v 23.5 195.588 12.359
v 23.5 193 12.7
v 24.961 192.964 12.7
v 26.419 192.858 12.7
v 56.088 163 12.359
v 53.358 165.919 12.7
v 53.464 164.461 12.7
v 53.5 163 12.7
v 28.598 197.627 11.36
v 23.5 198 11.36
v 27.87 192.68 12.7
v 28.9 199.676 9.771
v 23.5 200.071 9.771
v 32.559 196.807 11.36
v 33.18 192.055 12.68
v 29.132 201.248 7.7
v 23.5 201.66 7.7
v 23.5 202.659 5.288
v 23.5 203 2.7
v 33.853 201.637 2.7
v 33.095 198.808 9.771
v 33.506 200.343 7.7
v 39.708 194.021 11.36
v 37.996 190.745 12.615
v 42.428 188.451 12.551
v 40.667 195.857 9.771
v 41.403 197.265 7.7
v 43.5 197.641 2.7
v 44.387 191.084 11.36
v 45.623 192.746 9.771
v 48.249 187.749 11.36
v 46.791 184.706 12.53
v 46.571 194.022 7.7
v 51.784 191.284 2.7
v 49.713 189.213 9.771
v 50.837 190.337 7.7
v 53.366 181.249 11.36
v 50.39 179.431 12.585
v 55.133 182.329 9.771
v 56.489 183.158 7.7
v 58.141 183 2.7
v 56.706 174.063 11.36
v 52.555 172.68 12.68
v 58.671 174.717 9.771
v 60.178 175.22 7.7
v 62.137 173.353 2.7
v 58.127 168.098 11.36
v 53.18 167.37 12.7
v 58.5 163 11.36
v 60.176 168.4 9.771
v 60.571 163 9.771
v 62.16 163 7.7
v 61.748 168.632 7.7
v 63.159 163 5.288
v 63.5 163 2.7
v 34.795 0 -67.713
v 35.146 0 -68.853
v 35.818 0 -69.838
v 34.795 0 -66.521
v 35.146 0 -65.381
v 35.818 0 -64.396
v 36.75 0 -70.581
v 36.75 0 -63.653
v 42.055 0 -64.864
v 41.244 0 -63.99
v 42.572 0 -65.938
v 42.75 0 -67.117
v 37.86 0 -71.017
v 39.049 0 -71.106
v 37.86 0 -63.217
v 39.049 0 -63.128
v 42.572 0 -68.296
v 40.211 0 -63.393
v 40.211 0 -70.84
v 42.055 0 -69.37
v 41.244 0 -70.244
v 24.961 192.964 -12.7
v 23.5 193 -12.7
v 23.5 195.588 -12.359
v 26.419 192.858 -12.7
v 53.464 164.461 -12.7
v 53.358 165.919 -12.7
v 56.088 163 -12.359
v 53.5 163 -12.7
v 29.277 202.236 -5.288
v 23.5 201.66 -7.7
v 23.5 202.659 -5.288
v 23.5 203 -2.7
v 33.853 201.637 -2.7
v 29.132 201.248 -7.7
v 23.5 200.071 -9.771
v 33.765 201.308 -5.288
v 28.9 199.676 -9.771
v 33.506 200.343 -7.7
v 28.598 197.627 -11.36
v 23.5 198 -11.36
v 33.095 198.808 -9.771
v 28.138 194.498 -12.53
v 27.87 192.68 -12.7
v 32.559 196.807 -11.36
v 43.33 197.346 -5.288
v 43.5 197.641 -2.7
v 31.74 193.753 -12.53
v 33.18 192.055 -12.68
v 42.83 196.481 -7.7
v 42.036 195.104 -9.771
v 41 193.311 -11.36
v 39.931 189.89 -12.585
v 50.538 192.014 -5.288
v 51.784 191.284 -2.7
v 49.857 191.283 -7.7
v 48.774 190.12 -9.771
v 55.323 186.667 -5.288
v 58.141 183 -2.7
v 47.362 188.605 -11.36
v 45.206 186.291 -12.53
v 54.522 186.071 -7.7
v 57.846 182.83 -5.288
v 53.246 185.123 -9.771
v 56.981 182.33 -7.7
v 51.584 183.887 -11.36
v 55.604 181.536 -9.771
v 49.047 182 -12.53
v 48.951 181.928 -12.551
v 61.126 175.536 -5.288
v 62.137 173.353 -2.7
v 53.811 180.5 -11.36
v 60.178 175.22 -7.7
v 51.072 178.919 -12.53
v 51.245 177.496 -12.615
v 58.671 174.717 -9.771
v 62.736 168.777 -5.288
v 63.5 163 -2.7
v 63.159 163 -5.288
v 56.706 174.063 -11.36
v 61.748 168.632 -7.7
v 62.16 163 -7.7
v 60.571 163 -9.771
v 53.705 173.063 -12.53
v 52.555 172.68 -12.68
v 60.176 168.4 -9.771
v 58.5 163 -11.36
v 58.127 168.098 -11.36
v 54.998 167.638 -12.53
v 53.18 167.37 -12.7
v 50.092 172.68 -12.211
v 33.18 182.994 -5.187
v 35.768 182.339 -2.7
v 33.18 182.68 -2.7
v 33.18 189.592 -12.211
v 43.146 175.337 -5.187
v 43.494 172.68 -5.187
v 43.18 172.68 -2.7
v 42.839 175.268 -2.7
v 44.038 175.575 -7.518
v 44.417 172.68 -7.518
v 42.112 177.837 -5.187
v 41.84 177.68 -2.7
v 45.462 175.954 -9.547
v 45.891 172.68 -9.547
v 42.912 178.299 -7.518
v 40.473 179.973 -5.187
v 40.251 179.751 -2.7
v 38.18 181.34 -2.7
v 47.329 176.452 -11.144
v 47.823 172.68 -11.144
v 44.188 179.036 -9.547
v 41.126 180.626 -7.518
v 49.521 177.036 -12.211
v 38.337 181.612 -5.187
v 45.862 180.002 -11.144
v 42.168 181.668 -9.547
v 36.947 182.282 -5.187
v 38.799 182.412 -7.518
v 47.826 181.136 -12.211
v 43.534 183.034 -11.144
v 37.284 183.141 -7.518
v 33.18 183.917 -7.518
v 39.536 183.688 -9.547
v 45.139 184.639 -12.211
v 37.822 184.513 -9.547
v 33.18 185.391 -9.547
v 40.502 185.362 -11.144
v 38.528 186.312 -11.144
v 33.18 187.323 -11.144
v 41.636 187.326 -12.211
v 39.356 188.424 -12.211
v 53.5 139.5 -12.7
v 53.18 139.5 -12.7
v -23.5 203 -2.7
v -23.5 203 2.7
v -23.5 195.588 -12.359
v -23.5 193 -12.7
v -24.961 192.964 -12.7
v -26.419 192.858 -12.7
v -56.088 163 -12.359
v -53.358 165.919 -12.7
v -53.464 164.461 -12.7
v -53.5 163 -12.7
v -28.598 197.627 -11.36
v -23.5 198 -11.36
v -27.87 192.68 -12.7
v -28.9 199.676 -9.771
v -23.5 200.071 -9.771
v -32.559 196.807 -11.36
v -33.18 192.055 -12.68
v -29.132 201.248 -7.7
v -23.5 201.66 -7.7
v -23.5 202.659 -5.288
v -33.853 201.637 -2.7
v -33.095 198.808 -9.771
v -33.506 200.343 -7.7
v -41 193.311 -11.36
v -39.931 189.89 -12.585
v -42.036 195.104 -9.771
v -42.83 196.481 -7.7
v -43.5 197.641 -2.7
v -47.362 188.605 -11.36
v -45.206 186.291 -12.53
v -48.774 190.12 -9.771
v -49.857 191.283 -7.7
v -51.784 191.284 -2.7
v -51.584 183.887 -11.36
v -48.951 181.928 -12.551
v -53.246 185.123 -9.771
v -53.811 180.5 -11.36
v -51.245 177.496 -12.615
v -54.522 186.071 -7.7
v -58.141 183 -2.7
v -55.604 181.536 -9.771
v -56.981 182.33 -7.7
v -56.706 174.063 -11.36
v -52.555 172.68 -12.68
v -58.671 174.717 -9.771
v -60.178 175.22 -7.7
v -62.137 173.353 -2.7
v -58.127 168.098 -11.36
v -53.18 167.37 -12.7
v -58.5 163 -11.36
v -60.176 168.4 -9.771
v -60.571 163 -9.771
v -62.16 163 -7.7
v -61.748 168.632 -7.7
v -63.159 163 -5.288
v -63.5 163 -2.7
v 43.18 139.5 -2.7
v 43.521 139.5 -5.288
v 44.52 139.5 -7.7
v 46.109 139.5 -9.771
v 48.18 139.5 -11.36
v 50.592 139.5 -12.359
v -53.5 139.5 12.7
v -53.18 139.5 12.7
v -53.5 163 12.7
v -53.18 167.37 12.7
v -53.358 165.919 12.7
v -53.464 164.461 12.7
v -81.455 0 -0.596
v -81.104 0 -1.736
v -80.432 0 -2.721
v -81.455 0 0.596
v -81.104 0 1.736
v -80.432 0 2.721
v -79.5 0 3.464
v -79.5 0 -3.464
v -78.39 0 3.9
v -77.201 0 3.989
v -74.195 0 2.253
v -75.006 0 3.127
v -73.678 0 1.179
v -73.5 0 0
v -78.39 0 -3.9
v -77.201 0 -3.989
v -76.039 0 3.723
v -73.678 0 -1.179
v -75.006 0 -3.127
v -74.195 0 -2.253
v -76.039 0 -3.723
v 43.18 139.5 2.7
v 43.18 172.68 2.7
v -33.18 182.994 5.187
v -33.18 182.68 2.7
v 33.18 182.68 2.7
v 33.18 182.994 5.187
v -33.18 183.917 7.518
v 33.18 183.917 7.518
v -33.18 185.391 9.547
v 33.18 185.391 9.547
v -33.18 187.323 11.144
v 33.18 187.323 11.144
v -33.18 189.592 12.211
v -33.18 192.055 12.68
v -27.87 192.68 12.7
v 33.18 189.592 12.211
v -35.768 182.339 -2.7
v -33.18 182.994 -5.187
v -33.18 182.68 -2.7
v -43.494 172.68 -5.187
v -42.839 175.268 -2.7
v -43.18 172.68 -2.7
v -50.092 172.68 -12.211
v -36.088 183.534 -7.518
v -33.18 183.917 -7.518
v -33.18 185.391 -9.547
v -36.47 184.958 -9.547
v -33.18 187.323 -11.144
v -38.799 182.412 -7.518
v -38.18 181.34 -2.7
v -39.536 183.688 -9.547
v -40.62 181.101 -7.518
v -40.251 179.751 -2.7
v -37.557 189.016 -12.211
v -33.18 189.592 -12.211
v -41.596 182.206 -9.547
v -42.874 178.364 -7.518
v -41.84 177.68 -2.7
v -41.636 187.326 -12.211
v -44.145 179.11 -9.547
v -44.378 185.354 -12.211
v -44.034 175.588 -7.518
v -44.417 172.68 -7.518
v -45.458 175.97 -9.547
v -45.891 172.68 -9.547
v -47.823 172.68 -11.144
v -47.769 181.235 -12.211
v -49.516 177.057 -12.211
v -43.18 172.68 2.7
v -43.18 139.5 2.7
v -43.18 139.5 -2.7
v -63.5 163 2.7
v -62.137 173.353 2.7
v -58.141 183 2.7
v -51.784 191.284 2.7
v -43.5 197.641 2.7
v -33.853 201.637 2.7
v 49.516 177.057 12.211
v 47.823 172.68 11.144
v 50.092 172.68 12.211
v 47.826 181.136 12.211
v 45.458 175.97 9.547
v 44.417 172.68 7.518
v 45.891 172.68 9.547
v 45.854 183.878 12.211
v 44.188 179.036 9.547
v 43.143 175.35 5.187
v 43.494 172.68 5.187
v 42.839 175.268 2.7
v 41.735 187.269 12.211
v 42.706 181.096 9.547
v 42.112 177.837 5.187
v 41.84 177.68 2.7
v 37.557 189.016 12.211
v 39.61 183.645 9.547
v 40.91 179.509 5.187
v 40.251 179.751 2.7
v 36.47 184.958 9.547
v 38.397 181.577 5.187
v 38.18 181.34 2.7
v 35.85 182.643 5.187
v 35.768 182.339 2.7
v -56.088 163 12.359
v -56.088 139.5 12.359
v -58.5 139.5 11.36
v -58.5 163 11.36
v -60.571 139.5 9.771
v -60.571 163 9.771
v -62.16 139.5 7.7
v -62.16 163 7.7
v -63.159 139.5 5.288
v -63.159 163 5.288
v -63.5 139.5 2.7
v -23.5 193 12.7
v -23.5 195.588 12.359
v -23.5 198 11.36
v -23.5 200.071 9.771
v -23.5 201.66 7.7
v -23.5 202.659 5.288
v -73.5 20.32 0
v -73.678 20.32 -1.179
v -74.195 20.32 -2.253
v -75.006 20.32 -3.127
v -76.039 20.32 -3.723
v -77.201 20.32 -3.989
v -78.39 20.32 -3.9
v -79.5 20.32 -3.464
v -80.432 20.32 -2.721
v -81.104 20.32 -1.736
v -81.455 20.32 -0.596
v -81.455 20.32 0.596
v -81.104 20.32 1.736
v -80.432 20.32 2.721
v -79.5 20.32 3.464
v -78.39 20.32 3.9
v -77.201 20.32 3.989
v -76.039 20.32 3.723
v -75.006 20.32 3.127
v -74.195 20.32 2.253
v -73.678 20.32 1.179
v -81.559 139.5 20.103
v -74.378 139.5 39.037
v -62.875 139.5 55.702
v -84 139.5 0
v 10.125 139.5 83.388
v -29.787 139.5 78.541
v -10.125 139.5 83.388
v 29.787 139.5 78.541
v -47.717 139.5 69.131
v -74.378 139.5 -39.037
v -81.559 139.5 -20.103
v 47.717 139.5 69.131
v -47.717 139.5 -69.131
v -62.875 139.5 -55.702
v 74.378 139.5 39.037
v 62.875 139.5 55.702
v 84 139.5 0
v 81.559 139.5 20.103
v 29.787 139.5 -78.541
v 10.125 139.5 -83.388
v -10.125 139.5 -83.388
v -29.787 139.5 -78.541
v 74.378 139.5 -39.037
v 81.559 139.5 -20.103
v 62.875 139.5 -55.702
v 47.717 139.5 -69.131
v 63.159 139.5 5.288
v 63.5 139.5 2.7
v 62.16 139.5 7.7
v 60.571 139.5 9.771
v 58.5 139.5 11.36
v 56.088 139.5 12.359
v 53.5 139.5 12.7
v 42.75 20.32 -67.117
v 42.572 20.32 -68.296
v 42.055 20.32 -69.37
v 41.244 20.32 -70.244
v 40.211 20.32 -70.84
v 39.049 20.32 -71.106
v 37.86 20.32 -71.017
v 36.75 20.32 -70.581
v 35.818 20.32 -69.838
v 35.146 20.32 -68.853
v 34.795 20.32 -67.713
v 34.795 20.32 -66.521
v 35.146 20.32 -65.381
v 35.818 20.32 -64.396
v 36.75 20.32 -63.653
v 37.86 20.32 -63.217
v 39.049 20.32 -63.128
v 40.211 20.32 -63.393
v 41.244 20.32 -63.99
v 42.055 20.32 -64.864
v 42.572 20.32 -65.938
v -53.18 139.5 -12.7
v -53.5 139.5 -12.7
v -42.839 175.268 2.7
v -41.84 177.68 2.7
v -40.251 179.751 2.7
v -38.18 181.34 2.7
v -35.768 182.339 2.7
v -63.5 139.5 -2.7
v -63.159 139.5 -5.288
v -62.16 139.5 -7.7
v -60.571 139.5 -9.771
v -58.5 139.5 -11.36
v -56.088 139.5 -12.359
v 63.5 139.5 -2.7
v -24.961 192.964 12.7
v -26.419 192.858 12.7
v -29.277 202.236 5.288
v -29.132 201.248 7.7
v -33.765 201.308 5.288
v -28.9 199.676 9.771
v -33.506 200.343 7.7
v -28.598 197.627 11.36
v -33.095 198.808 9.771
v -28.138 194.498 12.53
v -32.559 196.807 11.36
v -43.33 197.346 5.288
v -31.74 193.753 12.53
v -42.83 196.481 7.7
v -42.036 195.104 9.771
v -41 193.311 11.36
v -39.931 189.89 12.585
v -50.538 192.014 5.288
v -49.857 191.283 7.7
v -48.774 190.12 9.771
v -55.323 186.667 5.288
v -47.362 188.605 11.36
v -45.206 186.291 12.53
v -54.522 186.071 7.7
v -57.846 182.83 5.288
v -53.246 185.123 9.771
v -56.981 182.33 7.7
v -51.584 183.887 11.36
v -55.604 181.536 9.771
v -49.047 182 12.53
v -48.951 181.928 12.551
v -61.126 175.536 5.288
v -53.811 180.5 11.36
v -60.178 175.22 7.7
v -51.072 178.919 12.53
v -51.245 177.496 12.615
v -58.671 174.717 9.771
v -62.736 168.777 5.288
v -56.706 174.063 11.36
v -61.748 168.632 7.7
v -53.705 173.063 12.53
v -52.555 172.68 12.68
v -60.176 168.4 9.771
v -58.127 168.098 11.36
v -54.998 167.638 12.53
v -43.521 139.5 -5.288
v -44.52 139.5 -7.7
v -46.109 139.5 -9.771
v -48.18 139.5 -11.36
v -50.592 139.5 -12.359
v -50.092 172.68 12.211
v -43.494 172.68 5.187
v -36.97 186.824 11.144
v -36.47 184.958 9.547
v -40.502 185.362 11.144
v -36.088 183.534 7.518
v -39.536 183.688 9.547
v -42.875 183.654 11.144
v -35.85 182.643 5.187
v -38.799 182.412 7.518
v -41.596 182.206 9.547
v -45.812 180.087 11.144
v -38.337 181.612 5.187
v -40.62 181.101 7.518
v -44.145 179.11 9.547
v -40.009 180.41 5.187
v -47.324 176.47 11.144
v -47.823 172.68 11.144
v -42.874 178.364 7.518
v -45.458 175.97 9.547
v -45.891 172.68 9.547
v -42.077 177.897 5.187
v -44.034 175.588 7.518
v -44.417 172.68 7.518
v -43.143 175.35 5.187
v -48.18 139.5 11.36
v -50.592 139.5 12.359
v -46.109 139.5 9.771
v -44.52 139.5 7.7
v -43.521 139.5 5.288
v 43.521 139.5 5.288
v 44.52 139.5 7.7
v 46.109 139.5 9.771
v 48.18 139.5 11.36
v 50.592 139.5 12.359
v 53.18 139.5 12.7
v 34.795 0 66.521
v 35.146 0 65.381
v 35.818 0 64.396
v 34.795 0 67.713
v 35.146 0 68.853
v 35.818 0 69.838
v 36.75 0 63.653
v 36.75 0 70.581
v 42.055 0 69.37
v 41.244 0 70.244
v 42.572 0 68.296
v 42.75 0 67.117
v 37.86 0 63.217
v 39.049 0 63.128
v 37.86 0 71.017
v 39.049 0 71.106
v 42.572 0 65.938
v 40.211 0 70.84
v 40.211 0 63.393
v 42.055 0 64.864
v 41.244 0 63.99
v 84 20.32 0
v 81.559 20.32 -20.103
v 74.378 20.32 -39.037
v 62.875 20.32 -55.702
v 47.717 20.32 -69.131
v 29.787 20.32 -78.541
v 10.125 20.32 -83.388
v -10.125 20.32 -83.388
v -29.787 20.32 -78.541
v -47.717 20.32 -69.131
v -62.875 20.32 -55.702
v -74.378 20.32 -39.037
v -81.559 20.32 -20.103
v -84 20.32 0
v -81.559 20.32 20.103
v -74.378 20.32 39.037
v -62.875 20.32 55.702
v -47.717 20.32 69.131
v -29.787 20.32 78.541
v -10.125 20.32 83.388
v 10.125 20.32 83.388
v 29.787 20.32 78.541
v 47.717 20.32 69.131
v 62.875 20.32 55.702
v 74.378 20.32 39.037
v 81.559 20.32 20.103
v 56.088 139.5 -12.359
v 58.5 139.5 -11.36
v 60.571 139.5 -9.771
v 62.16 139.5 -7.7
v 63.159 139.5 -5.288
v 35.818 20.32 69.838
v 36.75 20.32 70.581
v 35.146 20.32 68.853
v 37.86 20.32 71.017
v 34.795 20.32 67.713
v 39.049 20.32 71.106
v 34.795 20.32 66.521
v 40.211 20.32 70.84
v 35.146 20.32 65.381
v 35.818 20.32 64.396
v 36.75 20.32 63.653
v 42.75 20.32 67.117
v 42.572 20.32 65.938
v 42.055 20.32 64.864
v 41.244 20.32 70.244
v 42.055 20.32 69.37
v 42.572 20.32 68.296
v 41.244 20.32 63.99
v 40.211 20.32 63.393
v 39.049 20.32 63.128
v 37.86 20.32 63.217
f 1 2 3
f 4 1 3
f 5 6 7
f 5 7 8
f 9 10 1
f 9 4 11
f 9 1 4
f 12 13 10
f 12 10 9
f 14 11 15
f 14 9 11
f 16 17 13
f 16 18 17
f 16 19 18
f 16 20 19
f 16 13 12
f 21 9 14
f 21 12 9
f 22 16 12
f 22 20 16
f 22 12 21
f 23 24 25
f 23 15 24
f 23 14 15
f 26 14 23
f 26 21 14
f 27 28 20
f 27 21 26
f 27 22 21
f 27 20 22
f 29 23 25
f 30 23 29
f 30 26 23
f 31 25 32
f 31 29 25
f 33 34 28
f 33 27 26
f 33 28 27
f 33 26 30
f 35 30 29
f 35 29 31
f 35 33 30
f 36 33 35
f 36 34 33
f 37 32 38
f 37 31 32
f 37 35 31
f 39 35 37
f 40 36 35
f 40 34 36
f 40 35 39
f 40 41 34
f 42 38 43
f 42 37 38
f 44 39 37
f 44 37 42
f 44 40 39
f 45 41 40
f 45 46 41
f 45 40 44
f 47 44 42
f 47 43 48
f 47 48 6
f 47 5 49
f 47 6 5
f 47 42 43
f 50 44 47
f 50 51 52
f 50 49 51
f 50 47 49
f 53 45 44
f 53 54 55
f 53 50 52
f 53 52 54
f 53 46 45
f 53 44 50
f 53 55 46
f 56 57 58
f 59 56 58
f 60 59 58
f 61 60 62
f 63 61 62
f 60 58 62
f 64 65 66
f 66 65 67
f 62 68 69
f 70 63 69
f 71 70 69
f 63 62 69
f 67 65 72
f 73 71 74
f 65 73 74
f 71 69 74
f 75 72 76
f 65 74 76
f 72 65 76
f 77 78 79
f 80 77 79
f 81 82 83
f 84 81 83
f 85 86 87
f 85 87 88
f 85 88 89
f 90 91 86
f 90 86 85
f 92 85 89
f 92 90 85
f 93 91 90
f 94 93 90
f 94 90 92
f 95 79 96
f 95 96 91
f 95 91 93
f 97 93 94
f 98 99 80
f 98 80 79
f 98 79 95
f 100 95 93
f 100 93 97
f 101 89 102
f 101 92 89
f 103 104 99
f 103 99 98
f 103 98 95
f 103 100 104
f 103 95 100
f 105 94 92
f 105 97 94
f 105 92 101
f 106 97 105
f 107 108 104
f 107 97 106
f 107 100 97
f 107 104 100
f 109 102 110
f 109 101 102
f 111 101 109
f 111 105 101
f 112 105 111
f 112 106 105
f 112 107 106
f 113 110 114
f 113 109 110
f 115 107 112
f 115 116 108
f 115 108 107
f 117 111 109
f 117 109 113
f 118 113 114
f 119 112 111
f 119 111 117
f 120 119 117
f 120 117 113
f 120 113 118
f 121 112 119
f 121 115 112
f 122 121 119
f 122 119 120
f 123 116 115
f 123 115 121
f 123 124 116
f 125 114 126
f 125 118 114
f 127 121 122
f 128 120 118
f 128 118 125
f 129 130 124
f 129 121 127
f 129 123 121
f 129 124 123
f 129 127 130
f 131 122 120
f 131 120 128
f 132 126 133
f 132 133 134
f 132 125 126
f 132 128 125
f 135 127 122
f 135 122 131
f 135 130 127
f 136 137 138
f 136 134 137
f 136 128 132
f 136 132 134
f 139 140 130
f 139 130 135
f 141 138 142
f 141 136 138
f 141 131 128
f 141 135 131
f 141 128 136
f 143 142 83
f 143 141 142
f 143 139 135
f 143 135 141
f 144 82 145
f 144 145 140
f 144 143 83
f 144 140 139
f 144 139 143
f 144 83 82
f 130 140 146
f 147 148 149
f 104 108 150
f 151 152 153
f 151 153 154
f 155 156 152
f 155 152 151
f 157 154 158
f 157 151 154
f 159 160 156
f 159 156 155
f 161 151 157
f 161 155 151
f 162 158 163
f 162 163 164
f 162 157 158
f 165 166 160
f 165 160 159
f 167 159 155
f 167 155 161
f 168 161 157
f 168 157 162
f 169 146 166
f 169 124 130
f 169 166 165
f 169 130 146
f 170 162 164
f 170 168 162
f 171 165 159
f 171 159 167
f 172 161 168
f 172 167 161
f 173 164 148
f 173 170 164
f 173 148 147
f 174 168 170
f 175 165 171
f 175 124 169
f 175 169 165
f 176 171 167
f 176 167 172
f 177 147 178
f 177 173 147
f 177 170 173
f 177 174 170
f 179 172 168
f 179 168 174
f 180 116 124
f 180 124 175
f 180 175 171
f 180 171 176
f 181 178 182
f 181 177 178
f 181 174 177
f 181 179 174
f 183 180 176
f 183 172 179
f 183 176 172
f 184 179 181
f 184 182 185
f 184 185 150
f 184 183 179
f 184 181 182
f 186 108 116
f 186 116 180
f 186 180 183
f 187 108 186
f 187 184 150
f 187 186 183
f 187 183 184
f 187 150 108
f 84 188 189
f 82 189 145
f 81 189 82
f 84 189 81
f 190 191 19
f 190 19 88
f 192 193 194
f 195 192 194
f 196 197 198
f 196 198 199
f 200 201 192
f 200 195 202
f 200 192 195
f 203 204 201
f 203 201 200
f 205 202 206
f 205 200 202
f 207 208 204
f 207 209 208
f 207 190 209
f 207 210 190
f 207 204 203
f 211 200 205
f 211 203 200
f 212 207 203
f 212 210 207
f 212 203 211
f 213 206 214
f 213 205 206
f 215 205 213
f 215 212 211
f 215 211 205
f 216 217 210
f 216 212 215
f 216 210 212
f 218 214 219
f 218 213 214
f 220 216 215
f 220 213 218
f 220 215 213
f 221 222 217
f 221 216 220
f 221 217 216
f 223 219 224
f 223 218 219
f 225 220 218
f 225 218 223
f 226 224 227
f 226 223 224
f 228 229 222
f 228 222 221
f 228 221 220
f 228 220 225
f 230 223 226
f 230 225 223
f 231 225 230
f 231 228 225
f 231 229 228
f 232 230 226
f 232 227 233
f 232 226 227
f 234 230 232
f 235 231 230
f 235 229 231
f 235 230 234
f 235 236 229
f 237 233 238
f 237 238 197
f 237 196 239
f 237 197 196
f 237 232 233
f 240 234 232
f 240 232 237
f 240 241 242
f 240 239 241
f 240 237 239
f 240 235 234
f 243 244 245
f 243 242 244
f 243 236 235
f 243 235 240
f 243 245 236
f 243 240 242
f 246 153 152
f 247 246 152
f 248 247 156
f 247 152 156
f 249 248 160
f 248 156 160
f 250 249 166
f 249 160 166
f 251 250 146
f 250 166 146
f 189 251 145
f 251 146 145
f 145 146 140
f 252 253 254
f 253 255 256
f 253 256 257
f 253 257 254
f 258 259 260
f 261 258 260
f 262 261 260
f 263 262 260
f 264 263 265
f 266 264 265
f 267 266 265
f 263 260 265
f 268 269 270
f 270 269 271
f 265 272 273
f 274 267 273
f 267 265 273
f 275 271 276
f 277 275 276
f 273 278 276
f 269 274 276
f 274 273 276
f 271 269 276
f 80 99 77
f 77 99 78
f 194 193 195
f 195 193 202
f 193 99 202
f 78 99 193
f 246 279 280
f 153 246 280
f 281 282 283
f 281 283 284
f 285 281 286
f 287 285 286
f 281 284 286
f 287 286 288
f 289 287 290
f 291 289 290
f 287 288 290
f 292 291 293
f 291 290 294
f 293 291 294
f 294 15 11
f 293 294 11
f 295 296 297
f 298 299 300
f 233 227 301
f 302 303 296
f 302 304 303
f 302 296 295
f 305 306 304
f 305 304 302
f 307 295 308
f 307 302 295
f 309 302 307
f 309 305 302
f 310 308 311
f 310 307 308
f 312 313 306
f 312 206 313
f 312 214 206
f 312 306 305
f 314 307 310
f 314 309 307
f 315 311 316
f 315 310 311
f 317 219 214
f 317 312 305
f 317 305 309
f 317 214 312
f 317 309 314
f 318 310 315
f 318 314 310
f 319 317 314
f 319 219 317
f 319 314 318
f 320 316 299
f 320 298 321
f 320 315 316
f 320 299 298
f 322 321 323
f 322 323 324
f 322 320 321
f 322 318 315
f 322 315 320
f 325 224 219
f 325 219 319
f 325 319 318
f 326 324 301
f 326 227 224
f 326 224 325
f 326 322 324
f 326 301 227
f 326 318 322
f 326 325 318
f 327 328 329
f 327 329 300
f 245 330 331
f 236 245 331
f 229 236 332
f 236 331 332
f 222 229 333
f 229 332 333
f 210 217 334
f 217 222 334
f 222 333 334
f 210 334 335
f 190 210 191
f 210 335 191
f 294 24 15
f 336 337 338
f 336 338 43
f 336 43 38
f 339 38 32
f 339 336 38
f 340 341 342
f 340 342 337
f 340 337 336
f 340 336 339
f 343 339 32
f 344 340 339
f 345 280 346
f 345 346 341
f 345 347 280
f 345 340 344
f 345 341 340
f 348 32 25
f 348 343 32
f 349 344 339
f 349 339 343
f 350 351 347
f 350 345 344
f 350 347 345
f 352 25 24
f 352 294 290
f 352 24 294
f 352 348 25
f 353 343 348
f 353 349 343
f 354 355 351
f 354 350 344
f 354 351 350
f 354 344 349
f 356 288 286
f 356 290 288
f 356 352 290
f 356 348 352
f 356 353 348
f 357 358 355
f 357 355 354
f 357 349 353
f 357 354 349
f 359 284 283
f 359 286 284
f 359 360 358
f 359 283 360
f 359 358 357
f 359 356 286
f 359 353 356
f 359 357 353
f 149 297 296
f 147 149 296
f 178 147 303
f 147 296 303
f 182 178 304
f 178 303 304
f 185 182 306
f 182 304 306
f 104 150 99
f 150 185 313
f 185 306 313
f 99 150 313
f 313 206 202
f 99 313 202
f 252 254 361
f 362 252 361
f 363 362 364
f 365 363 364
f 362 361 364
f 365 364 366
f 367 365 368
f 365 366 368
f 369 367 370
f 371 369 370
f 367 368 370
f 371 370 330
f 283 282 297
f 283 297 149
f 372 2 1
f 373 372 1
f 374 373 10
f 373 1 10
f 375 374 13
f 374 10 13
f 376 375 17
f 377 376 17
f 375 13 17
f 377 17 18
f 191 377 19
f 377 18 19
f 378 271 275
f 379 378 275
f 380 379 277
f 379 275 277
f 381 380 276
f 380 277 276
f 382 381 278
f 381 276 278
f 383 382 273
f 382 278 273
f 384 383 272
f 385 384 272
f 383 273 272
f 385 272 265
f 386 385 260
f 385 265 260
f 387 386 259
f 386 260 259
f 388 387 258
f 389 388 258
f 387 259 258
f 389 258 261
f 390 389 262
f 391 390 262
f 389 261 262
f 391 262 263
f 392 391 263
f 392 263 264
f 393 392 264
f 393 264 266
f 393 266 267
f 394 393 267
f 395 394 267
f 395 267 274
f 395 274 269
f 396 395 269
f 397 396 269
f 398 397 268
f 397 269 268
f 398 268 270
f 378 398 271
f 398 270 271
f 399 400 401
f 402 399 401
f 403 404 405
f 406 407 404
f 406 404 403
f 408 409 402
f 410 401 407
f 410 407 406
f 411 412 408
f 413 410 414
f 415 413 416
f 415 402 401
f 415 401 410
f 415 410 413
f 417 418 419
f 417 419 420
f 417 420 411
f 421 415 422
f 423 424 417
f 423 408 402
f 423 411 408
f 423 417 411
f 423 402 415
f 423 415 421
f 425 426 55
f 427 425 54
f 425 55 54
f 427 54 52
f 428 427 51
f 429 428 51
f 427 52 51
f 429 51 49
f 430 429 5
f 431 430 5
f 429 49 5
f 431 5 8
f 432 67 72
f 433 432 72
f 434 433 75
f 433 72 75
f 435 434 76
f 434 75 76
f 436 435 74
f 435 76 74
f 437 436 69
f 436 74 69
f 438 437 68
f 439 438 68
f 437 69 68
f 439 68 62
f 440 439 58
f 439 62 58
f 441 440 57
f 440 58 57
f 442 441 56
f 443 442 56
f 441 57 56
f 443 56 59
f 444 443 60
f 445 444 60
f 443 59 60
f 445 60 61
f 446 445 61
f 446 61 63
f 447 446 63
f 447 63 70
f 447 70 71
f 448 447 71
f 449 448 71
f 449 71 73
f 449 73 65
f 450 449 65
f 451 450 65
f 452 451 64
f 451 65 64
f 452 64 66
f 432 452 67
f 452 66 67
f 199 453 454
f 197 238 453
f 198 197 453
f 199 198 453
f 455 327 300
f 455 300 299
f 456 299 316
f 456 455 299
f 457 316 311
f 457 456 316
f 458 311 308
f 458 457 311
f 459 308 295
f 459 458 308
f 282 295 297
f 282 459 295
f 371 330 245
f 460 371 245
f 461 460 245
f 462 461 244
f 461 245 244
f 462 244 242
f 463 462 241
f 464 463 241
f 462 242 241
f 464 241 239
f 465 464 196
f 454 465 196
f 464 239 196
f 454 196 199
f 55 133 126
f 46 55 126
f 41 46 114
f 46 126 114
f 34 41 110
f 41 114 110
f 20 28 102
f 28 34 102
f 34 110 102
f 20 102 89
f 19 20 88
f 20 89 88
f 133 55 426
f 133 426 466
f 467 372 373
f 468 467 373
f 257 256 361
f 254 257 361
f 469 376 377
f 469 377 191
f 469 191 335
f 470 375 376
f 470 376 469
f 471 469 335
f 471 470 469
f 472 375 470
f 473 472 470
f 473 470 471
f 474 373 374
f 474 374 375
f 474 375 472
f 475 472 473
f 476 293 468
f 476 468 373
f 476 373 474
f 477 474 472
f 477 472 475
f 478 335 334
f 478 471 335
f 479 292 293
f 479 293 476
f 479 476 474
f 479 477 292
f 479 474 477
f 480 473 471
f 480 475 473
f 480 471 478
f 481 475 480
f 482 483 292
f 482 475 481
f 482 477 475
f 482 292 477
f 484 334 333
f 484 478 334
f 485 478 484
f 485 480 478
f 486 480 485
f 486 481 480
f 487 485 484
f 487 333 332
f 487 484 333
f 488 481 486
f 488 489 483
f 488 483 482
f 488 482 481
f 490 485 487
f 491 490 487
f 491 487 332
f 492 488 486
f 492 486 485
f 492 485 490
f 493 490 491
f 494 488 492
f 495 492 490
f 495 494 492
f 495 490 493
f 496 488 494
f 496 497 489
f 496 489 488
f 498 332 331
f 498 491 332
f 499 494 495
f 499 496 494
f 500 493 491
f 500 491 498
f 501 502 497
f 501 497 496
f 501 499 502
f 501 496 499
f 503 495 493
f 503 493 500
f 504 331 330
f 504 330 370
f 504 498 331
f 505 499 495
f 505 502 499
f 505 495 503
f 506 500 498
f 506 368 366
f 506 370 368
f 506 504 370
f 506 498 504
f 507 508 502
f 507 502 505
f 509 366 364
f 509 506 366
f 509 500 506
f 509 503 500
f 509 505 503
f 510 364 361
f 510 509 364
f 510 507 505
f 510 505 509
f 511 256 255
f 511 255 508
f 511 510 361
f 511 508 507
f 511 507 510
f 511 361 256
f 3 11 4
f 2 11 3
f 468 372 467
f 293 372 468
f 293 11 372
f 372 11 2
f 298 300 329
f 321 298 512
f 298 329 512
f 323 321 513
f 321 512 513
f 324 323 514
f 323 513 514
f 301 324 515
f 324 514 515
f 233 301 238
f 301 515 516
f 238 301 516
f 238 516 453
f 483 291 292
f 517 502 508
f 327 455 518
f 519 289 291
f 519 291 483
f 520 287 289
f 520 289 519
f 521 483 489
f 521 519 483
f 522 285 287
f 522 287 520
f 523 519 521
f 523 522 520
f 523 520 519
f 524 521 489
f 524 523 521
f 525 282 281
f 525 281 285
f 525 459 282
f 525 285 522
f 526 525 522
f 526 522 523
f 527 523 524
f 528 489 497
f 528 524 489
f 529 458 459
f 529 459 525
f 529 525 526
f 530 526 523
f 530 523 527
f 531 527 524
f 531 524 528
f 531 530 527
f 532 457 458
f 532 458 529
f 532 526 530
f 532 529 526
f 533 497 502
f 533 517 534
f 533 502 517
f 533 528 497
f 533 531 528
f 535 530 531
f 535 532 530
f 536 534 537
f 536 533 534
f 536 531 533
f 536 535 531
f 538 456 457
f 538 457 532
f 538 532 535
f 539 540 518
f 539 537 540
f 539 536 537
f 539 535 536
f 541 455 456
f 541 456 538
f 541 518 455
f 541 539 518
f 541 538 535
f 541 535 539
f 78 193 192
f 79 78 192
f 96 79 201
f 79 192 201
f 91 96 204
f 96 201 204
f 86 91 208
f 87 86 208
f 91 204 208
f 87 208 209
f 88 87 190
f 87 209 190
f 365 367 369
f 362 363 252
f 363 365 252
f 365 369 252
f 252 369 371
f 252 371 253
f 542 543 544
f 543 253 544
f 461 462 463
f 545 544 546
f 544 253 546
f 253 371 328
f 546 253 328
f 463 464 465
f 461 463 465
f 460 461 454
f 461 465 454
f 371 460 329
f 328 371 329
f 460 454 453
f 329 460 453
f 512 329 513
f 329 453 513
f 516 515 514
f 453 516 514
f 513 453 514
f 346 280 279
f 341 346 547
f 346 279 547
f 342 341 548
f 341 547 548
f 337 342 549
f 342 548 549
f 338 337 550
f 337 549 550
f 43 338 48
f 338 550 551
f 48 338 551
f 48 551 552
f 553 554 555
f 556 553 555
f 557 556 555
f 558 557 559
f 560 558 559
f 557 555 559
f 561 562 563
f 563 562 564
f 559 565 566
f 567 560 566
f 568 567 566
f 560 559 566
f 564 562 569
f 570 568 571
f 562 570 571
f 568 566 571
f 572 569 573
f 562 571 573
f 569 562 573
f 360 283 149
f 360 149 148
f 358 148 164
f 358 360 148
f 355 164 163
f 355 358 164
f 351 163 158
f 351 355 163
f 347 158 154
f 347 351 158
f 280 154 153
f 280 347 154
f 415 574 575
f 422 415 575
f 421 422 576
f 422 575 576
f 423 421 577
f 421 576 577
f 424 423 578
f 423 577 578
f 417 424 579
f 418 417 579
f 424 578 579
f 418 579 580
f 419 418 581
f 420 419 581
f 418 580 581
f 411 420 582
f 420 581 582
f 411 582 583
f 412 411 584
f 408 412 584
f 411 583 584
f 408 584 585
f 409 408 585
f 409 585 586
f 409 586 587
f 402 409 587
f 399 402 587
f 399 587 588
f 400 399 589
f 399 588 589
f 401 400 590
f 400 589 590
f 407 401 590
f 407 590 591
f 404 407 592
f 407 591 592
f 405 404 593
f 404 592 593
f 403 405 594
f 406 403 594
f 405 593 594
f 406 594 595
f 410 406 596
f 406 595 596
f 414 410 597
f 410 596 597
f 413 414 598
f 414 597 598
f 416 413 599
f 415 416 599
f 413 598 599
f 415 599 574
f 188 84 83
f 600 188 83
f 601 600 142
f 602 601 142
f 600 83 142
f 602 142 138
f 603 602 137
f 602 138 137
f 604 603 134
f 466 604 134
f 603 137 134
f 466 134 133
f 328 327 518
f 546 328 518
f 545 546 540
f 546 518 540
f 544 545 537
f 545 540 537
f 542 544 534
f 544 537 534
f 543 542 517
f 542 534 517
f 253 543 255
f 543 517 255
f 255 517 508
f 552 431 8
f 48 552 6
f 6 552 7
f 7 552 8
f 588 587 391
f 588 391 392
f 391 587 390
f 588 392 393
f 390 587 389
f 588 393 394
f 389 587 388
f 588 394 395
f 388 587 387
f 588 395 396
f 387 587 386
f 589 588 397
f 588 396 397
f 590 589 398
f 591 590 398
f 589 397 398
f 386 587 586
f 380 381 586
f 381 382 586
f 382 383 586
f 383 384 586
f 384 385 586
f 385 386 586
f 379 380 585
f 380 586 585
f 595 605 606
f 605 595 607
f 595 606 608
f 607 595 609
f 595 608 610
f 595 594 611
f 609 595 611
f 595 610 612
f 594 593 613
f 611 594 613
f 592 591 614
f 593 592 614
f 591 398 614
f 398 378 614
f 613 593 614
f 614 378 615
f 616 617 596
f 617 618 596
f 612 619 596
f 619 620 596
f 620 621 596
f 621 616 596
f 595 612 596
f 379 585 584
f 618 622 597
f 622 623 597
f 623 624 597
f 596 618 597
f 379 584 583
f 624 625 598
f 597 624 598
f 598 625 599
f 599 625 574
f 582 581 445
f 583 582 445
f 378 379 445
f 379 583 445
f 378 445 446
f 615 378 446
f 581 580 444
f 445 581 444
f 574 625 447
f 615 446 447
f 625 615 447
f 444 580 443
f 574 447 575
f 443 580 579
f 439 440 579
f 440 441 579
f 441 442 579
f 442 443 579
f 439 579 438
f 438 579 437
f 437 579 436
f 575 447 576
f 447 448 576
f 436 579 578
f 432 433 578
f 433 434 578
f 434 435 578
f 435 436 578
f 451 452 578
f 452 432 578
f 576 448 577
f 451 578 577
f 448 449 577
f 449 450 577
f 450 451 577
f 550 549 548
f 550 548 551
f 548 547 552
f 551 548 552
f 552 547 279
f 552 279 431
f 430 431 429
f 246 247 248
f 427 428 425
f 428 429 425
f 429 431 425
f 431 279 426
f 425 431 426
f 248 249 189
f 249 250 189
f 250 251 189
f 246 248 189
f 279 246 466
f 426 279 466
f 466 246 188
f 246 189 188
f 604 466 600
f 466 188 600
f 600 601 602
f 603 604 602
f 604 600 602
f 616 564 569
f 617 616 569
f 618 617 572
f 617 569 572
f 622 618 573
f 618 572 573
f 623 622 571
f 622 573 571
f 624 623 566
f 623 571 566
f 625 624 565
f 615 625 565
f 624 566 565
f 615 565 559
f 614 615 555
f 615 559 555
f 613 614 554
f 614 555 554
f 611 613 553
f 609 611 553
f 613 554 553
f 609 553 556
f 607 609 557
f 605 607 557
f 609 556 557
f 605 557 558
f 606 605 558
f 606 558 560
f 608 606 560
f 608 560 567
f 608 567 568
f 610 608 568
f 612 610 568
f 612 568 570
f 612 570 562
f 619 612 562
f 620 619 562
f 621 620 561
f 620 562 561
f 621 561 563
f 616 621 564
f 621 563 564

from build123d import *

# Parameters (mm, degrees)
SKETCH1_R           = 84
BOSS_EXTRUDE1_DEPTH = 203
SKETCH2_OUTSIDE_W   = 232.5
SKETCH2_OUTSIDE_H   = 232.5
SKETCH2_OUTSIDE_W_2 = 127
SKETCH2_OUTSIDE_H_2 = 25.4
CUT_EXTRUDE1_DEPTH  = 63.5
CUT_EXTRUDE2_REACH  = 242.033
SKETCH3_W           = 86.36
SKETCH3_H           = 43.18
FILLET1_R           = 10
FILLET1_R_2         = 40
SKETCH4_OUTSIDE_W   = 232.5
SKETCH4_OUTSIDE_H   = 232.5
SKETCH4_OUTSIDE_R   = 4
CUT_EXTRUDE3_DEPTH  = 20.32
SPLIT1_START        = 20.32
SPLIT1_OUTLINE_R    = 84
SPLIT1_DEPTH        = 119.18
SPLIT1_2_OUTLINE_R  = 4
SPLIT1_2_DEPTH      = 20.32
SPLIT1_3_OUTLINE_R  = 84
SPLIT1_3_DEPTH      = 139.5


# Read off the part's stored shape, not the designer's step: Split1
with BuildPart() as part:
    # Sketch1 → Boss-Extrude1 (new body)
    with BuildSketch(Plane(origin=(0, 0, 0), x_dir=(1, 0, 0), z_dir=(0, 1, 0))):
        with Locations(Location((0, 0, 0), (0, 0, 90))):
            Circle(SKETCH1_R)
    extrude(amount=BOSS_EXTRUDE1_DEPTH)

    # Sketch2 outside → Cut-Extrude1 (cut)
    with BuildSketch(Plane(origin=(0, 203, 0), x_dir=(1, 0, 0), z_dir=(0, 1, 0))):
        Rectangle(SKETCH2_OUTSIDE_W, SKETCH2_OUTSIDE_H)
        Rectangle(SKETCH2_OUTSIDE_W_2, SKETCH2_OUTSIDE_H_2, mode=Mode.SUBTRACT)
    extrude(amount=-CUT_EXTRUDE1_DEPTH, mode=Mode.SUBTRACT)

    # Sketch3 → Cut-Extrude2 (cut, up to next)
    with BuildSketch(Plane.XY.offset(12.7), mode=Mode.PRIVATE) as cut_extrude2_sk1:
        with Locations((0, 161.09)):
            Rectangle(SKETCH3_W, SKETCH3_H)
    cut_extrude2_tool1 = extrude(cut_extrude2_sk1.sketch, amount=-CUT_EXTRUDE2_REACH, mode=Mode.PRIVATE) & part.part
    add(cut_extrude2_tool1.solids().sort_by_distance((0, 161.09, 12.7))[0], mode=Mode.SUBTRACT)

    # Fillet1
    # the kernel refuses this fillet: 40, 10 mm, written as the material it adds along each edge
    with BuildSketch(Plane(origin=(-43.18, 182.68, 12.7), x_dir=(1, 0, 0), z_dir=(0, 0, -1)), Plane(origin=(43.18, 182.68, 12.7), x_dir=(0, -1, 0), z_dir=(0, 0, -1))) as fillet1_piece_1:
        with BuildLine():
            CenterArc((FILLET1_R, FILLET1_R), FILLET1_R, 180, 90)
            Line((0, FILLET1_R), (0, 0))
            Line((0, 0), (FILLET1_R, 0))
        make_face()
    extrude(amount=25.4)
    # the kernel refuses this fillet: 40, 10 mm, written as the material it takes off along each edge
    with BuildSketch(Plane(origin=(-63.5, 203, 112.7), x_dir=(0, -1, 0), z_dir=(0, 0, -1)), Plane(origin=(63.5, 203, -112.7), x_dir=(0, -1, 0), z_dir=(0, 0, 1))) as fillet1_2_piece_1:
        with BuildLine():
            CenterArc((FILLET1_R_2, -FILLET1_R_2), FILLET1_R_2, 90, 90)
            Line((0, -FILLET1_R_2), (0, 0))
            Line((0, 0), (FILLET1_R_2, 0))
        make_face()
    extrude(amount=225.4, mode=Mode.SUBTRACT)
    # the kernel refuses this fillet: 40, 10 mm, written as the material it takes off along each edge
    with BuildSketch(Plane(origin=(-43.18, 139.5, -12.7), x_dir=(-1, 0, 0), z_dir=(0, 1, 0)), Plane(origin=(43.18, 139.5, 12.7), x_dir=(1, 0, 0), z_dir=(0, 1, 0)), Plane(origin=(43.18, 172.68, -12.7), x_dir=(1, 0, 0), z_dir=(0, -1, 0))) as fillet1_3_piece_1:
        with BuildLine():
            CenterArc((FILLET1_R, FILLET1_R), FILLET1_R, 180, 90)
            Line((0, FILLET1_R), (0, 0))
            Line((0, 0), (FILLET1_R, 0))
        make_face()
    extrude(amount=33.18, mode=Mode.SUBTRACT)
    with BuildSketch(Plane(origin=(-63.5, 163, -12.7), x_dir=(1, 0, 0), z_dir=(0, -1, 0)), Plane(origin=(63.5, 163, 12.7), x_dir=(-1, 0, 0), z_dir=(0, -1, 0))) as fillet1_3_piece_2:
        with BuildLine():
            CenterArc((FILLET1_R, FILLET1_R), FILLET1_R, 180, 90)
            Line((0, FILLET1_R), (0, 0))
            Line((0, 0), (FILLET1_R, 0))
        make_face()
    extrude(amount=23.5, mode=Mode.SUBTRACT)
    with BuildSketch(Plane(origin=(-43.18, 172.68, 12.7), x_dir=(0, 0, -1), z_dir=(0, -1, 0))) as fillet1_3_piece_3:
        with BuildLine():
            CenterArc((FILLET1_R, -FILLET1_R), FILLET1_R, 90, 90)
            Line((0, -FILLET1_R), (0, 0))
            Line((0, 0), (FILLET1_R, 0))
        make_face()
    extrude(amount=33.18, mode=Mode.SUBTRACT)
    with BuildSketch(Plane(origin=(-63.5, 163, 12.7), x_dir=(1, 0, 0), z_dir=(0, -1, 0)), Plane(origin=(63.5, 163, -12.7), x_dir=(-1, 0, 0), z_dir=(0, -1, 0))) as fillet1_3_piece_4:
        with BuildLine():
            CenterArc((FILLET1_R, -FILLET1_R), FILLET1_R, 90, 90)
            Line((0, -FILLET1_R), (0, 0))
            Line((0, 0), (FILLET1_R, 0))
        make_face()
    extrude(amount=23.5, mode=Mode.SUBTRACT)
    with BuildSketch(Plane(origin=(33.18, 182.68, 12.7), x_dir=(0, 1, 0), z_dir=(-1, 0, 0)), Plane(origin=(-33.18, 182.68, -12.7), x_dir=(0, 1, 0), z_dir=(1, 0, 0))) as fillet1_3_piece_5:
        with BuildLine():
            CenterArc((FILLET1_R, FILLET1_R), FILLET1_R, 180, 90)
            Line((0, FILLET1_R), (0, 0))
            Line((0, 0), (FILLET1_R, 0))
        make_face()
    extrude(amount=66.36, mode=Mode.SUBTRACT)
    with BuildSketch(Plane(origin=(23.5, 203, 12.7), x_dir=(0, -1, 0), z_dir=(-1, 0, 0)), Plane(origin=(-23.5, 203, -12.7), x_dir=(0, -1, 0), z_dir=(1, 0, 0))) as fillet1_3_piece_6:
        with BuildLine():
            CenterArc((FILLET1_R, -FILLET1_R), FILLET1_R, 90, 90)
            Line((0, -FILLET1_R), (0, 0))
            Line((0, 0), (FILLET1_R, 0))
        make_face()
    extrude(amount=47, mode=Mode.SUBTRACT)
    with BuildSketch(Plane(origin=(23.5, 163, -12.7), x_dir=(0, 1, 0), z_dir=(-1, 0, 0))) as fillet1_3_piece_7:
        with BuildLine():
            CenterArc((40 - FILLET1_R, -FILLET1_R), FILLET1_R, 0, 90)
            Line((40, -FILLET1_R), (40, 0))
            Line((40, 0), (40 - FILLET1_R, 0))
        make_face()
    revolve(axis=Axis((23.5, 163, -12.7), (0, 0, -1)), revolution_arc=90, mode=Mode.SUBTRACT)
    with BuildSketch(Plane(origin=(23.5, 163, 12.7), x_dir=(0, 1, 0), z_dir=(-1, 0, 0))) as fillet1_3_piece_8:
        with BuildLine():
            CenterArc((40 - FILLET1_R, FILLET1_R), FILLET1_R, 270, 90)
            Line((40, FILLET1_R), (40, 0))
            Line((40, 0), (40 - FILLET1_R, 0))
        make_face()
    revolve(axis=Axis((23.5, 163, 12.7), (0, 0, -1)), revolution_arc=90, mode=Mode.SUBTRACT)
    with BuildSketch(Plane(origin=(33.18, 172.68, -12.7), x_dir=(1, 0, 0), z_dir=(0, -1, 0))) as fillet1_3_piece_9:
        with BuildLine():
            CenterArc((10 + FILLET1_R, FILLET1_R), FILLET1_R, 180, 90)
            Line((10, FILLET1_R), (10, 0))
            Line((10, 0), (10 + FILLET1_R, 0))
        make_face()
    revolve(axis=Axis((33.18, 172.68, -12.7), (0, 0, 1)), revolution_arc=90, mode=Mode.SUBTRACT)
    with BuildSketch(Plane(origin=(33.18, 172.68, 12.7), x_dir=(1, 0, 0), z_dir=(0, -1, 0))) as fillet1_3_piece_10:
        with BuildLine():
            CenterArc((10 + FILLET1_R, -FILLET1_R), FILLET1_R, 90, 90)
            Line((10, -FILLET1_R), (10, 0))
            Line((10, 0), (10 + FILLET1_R, 0))
        make_face()
    revolve(axis=Axis((33.18, 172.68, 12.7), (0, 0, 1)), revolution_arc=90, mode=Mode.SUBTRACT)
    with BuildSketch(Plane(origin=(-33.18, 172.68, -12.7), x_dir=(0, 1, 0), z_dir=(1, 0, 0))) as fillet1_3_piece_11:
        with BuildLine():
            CenterArc((10 + FILLET1_R, FILLET1_R), FILLET1_R, 180, 90)
            Line((10, FILLET1_R), (10, 0))
            Line((10, 0), (10 + FILLET1_R, 0))
        make_face()
    revolve(axis=Axis((-33.18, 172.68, -12.7), (0, 0, 1)), revolution_arc=90, mode=Mode.SUBTRACT)
    with BuildSketch(Plane(origin=(-23.5, 163, -12.7), x_dir=(0, 1, 0), z_dir=(1, 0, 0))) as fillet1_3_piece_12:
        with BuildLine():
            CenterArc((40 - FILLET1_R, FILLET1_R), FILLET1_R, 270, 90)
            Line((40, FILLET1_R), (40, 0))
            Line((40, 0), (40 - FILLET1_R, 0))
        make_face()
    revolve(axis=Axis((-23.5, 163, -12.7), (0, 0, 1)), revolution_arc=90, mode=Mode.SUBTRACT)
    with BuildSketch(Plane(origin=(-23.5, 163, 12.7), x_dir=(0, 1, 0), z_dir=(1, 0, 0))) as fillet1_3_piece_13:
        with BuildLine():
            CenterArc((40 - FILLET1_R, -FILLET1_R), FILLET1_R, 0, 90)
            Line((40, -FILLET1_R), (40, 0))
            Line((40, 0), (40 - FILLET1_R, 0))
        make_face()
    revolve(axis=Axis((-23.5, 163, 12.7), (0, 0, 1)), revolution_arc=90, mode=Mode.SUBTRACT)
    with BuildSketch(Plane(origin=(-33.18, 172.68, 12.7), x_dir=(0, 1, 0), z_dir=(1, 0, 0))) as fillet1_3_piece_14:
        with BuildLine():
            CenterArc((10 + FILLET1_R, -FILLET1_R), FILLET1_R, 90, 90)
            Line((10, -FILLET1_R), (10, 0))
            Line((10, 0), (10 + FILLET1_R, 0))
        make_face()
    revolve(axis=Axis((-33.18, 172.68, 12.7), (0, 0, 1)), revolution_arc=90, mode=Mode.SUBTRACT)

    # Sketch4 outside → Cut-Extrude3 (cut)
    with BuildSketch(Plane.XZ):
        Rectangle(SKETCH4_OUTSIDE_W, SKETCH4_OUTSIDE_H)
        with Locations(Location((-77.5, 0, 0), (0, 0, 270))):
            Circle(SKETCH4_OUTSIDE_R, mode=Mode.SUBTRACT)
        with Locations(Location((38.75, 67.116968793, 0), (0, 0, 270))):
            Circle(SKETCH4_OUTSIDE_R, mode=Mode.SUBTRACT)
        with Locations(Location((38.75, -67.116968793, 0), (0, 0, 270))):
            Circle(SKETCH4_OUTSIDE_R, mode=Mode.SUBTRACT)
    extrude(amount=-CUT_EXTRUDE3_DEPTH, mode=Mode.SUBTRACT)

    # Split1 3 outline → Split1 3 (cut)
    with BuildSketch(Plane(origin=(0, 0, 0), x_dir=(1, 0, 0), z_dir=(0, 1, 0))):
        Circle(SPLIT1_3_OUTLINE_R)
    extrude(amount=SPLIT1_3_DEPTH, mode=Mode.SUBTRACT)


with BuildPart() as body_2:
    # Split1 outline → Split1 (new body)
    with BuildSketch(Plane(origin=(0, 0, 0), x_dir=(1, 0, 0), z_dir=(0, 1, 0)).offset(SPLIT1_START)):
        Circle(SPLIT1_OUTLINE_R)
    extrude(amount=SPLIT1_DEPTH)

    # Split1 2 outline → Split1 2 (add)
    with BuildSketch(Plane(origin=(0, 0, 0), x_dir=(1, 0, 0), z_dir=(0, 1, 0))):
        with Locations((-77.5, 0)):
            Circle(SPLIT1_2_OUTLINE_R)
        with Locations((38.75, -67.116968793)):
            Circle(SPLIT1_2_OUTLINE_R)
        with Locations((38.75, 67.116968793)):
            Circle(SPLIT1_2_OUTLINE_R)
    extrude(amount=SPLIT1_2_DEPTH)


solid = Compound([part.part, body_2.part])
